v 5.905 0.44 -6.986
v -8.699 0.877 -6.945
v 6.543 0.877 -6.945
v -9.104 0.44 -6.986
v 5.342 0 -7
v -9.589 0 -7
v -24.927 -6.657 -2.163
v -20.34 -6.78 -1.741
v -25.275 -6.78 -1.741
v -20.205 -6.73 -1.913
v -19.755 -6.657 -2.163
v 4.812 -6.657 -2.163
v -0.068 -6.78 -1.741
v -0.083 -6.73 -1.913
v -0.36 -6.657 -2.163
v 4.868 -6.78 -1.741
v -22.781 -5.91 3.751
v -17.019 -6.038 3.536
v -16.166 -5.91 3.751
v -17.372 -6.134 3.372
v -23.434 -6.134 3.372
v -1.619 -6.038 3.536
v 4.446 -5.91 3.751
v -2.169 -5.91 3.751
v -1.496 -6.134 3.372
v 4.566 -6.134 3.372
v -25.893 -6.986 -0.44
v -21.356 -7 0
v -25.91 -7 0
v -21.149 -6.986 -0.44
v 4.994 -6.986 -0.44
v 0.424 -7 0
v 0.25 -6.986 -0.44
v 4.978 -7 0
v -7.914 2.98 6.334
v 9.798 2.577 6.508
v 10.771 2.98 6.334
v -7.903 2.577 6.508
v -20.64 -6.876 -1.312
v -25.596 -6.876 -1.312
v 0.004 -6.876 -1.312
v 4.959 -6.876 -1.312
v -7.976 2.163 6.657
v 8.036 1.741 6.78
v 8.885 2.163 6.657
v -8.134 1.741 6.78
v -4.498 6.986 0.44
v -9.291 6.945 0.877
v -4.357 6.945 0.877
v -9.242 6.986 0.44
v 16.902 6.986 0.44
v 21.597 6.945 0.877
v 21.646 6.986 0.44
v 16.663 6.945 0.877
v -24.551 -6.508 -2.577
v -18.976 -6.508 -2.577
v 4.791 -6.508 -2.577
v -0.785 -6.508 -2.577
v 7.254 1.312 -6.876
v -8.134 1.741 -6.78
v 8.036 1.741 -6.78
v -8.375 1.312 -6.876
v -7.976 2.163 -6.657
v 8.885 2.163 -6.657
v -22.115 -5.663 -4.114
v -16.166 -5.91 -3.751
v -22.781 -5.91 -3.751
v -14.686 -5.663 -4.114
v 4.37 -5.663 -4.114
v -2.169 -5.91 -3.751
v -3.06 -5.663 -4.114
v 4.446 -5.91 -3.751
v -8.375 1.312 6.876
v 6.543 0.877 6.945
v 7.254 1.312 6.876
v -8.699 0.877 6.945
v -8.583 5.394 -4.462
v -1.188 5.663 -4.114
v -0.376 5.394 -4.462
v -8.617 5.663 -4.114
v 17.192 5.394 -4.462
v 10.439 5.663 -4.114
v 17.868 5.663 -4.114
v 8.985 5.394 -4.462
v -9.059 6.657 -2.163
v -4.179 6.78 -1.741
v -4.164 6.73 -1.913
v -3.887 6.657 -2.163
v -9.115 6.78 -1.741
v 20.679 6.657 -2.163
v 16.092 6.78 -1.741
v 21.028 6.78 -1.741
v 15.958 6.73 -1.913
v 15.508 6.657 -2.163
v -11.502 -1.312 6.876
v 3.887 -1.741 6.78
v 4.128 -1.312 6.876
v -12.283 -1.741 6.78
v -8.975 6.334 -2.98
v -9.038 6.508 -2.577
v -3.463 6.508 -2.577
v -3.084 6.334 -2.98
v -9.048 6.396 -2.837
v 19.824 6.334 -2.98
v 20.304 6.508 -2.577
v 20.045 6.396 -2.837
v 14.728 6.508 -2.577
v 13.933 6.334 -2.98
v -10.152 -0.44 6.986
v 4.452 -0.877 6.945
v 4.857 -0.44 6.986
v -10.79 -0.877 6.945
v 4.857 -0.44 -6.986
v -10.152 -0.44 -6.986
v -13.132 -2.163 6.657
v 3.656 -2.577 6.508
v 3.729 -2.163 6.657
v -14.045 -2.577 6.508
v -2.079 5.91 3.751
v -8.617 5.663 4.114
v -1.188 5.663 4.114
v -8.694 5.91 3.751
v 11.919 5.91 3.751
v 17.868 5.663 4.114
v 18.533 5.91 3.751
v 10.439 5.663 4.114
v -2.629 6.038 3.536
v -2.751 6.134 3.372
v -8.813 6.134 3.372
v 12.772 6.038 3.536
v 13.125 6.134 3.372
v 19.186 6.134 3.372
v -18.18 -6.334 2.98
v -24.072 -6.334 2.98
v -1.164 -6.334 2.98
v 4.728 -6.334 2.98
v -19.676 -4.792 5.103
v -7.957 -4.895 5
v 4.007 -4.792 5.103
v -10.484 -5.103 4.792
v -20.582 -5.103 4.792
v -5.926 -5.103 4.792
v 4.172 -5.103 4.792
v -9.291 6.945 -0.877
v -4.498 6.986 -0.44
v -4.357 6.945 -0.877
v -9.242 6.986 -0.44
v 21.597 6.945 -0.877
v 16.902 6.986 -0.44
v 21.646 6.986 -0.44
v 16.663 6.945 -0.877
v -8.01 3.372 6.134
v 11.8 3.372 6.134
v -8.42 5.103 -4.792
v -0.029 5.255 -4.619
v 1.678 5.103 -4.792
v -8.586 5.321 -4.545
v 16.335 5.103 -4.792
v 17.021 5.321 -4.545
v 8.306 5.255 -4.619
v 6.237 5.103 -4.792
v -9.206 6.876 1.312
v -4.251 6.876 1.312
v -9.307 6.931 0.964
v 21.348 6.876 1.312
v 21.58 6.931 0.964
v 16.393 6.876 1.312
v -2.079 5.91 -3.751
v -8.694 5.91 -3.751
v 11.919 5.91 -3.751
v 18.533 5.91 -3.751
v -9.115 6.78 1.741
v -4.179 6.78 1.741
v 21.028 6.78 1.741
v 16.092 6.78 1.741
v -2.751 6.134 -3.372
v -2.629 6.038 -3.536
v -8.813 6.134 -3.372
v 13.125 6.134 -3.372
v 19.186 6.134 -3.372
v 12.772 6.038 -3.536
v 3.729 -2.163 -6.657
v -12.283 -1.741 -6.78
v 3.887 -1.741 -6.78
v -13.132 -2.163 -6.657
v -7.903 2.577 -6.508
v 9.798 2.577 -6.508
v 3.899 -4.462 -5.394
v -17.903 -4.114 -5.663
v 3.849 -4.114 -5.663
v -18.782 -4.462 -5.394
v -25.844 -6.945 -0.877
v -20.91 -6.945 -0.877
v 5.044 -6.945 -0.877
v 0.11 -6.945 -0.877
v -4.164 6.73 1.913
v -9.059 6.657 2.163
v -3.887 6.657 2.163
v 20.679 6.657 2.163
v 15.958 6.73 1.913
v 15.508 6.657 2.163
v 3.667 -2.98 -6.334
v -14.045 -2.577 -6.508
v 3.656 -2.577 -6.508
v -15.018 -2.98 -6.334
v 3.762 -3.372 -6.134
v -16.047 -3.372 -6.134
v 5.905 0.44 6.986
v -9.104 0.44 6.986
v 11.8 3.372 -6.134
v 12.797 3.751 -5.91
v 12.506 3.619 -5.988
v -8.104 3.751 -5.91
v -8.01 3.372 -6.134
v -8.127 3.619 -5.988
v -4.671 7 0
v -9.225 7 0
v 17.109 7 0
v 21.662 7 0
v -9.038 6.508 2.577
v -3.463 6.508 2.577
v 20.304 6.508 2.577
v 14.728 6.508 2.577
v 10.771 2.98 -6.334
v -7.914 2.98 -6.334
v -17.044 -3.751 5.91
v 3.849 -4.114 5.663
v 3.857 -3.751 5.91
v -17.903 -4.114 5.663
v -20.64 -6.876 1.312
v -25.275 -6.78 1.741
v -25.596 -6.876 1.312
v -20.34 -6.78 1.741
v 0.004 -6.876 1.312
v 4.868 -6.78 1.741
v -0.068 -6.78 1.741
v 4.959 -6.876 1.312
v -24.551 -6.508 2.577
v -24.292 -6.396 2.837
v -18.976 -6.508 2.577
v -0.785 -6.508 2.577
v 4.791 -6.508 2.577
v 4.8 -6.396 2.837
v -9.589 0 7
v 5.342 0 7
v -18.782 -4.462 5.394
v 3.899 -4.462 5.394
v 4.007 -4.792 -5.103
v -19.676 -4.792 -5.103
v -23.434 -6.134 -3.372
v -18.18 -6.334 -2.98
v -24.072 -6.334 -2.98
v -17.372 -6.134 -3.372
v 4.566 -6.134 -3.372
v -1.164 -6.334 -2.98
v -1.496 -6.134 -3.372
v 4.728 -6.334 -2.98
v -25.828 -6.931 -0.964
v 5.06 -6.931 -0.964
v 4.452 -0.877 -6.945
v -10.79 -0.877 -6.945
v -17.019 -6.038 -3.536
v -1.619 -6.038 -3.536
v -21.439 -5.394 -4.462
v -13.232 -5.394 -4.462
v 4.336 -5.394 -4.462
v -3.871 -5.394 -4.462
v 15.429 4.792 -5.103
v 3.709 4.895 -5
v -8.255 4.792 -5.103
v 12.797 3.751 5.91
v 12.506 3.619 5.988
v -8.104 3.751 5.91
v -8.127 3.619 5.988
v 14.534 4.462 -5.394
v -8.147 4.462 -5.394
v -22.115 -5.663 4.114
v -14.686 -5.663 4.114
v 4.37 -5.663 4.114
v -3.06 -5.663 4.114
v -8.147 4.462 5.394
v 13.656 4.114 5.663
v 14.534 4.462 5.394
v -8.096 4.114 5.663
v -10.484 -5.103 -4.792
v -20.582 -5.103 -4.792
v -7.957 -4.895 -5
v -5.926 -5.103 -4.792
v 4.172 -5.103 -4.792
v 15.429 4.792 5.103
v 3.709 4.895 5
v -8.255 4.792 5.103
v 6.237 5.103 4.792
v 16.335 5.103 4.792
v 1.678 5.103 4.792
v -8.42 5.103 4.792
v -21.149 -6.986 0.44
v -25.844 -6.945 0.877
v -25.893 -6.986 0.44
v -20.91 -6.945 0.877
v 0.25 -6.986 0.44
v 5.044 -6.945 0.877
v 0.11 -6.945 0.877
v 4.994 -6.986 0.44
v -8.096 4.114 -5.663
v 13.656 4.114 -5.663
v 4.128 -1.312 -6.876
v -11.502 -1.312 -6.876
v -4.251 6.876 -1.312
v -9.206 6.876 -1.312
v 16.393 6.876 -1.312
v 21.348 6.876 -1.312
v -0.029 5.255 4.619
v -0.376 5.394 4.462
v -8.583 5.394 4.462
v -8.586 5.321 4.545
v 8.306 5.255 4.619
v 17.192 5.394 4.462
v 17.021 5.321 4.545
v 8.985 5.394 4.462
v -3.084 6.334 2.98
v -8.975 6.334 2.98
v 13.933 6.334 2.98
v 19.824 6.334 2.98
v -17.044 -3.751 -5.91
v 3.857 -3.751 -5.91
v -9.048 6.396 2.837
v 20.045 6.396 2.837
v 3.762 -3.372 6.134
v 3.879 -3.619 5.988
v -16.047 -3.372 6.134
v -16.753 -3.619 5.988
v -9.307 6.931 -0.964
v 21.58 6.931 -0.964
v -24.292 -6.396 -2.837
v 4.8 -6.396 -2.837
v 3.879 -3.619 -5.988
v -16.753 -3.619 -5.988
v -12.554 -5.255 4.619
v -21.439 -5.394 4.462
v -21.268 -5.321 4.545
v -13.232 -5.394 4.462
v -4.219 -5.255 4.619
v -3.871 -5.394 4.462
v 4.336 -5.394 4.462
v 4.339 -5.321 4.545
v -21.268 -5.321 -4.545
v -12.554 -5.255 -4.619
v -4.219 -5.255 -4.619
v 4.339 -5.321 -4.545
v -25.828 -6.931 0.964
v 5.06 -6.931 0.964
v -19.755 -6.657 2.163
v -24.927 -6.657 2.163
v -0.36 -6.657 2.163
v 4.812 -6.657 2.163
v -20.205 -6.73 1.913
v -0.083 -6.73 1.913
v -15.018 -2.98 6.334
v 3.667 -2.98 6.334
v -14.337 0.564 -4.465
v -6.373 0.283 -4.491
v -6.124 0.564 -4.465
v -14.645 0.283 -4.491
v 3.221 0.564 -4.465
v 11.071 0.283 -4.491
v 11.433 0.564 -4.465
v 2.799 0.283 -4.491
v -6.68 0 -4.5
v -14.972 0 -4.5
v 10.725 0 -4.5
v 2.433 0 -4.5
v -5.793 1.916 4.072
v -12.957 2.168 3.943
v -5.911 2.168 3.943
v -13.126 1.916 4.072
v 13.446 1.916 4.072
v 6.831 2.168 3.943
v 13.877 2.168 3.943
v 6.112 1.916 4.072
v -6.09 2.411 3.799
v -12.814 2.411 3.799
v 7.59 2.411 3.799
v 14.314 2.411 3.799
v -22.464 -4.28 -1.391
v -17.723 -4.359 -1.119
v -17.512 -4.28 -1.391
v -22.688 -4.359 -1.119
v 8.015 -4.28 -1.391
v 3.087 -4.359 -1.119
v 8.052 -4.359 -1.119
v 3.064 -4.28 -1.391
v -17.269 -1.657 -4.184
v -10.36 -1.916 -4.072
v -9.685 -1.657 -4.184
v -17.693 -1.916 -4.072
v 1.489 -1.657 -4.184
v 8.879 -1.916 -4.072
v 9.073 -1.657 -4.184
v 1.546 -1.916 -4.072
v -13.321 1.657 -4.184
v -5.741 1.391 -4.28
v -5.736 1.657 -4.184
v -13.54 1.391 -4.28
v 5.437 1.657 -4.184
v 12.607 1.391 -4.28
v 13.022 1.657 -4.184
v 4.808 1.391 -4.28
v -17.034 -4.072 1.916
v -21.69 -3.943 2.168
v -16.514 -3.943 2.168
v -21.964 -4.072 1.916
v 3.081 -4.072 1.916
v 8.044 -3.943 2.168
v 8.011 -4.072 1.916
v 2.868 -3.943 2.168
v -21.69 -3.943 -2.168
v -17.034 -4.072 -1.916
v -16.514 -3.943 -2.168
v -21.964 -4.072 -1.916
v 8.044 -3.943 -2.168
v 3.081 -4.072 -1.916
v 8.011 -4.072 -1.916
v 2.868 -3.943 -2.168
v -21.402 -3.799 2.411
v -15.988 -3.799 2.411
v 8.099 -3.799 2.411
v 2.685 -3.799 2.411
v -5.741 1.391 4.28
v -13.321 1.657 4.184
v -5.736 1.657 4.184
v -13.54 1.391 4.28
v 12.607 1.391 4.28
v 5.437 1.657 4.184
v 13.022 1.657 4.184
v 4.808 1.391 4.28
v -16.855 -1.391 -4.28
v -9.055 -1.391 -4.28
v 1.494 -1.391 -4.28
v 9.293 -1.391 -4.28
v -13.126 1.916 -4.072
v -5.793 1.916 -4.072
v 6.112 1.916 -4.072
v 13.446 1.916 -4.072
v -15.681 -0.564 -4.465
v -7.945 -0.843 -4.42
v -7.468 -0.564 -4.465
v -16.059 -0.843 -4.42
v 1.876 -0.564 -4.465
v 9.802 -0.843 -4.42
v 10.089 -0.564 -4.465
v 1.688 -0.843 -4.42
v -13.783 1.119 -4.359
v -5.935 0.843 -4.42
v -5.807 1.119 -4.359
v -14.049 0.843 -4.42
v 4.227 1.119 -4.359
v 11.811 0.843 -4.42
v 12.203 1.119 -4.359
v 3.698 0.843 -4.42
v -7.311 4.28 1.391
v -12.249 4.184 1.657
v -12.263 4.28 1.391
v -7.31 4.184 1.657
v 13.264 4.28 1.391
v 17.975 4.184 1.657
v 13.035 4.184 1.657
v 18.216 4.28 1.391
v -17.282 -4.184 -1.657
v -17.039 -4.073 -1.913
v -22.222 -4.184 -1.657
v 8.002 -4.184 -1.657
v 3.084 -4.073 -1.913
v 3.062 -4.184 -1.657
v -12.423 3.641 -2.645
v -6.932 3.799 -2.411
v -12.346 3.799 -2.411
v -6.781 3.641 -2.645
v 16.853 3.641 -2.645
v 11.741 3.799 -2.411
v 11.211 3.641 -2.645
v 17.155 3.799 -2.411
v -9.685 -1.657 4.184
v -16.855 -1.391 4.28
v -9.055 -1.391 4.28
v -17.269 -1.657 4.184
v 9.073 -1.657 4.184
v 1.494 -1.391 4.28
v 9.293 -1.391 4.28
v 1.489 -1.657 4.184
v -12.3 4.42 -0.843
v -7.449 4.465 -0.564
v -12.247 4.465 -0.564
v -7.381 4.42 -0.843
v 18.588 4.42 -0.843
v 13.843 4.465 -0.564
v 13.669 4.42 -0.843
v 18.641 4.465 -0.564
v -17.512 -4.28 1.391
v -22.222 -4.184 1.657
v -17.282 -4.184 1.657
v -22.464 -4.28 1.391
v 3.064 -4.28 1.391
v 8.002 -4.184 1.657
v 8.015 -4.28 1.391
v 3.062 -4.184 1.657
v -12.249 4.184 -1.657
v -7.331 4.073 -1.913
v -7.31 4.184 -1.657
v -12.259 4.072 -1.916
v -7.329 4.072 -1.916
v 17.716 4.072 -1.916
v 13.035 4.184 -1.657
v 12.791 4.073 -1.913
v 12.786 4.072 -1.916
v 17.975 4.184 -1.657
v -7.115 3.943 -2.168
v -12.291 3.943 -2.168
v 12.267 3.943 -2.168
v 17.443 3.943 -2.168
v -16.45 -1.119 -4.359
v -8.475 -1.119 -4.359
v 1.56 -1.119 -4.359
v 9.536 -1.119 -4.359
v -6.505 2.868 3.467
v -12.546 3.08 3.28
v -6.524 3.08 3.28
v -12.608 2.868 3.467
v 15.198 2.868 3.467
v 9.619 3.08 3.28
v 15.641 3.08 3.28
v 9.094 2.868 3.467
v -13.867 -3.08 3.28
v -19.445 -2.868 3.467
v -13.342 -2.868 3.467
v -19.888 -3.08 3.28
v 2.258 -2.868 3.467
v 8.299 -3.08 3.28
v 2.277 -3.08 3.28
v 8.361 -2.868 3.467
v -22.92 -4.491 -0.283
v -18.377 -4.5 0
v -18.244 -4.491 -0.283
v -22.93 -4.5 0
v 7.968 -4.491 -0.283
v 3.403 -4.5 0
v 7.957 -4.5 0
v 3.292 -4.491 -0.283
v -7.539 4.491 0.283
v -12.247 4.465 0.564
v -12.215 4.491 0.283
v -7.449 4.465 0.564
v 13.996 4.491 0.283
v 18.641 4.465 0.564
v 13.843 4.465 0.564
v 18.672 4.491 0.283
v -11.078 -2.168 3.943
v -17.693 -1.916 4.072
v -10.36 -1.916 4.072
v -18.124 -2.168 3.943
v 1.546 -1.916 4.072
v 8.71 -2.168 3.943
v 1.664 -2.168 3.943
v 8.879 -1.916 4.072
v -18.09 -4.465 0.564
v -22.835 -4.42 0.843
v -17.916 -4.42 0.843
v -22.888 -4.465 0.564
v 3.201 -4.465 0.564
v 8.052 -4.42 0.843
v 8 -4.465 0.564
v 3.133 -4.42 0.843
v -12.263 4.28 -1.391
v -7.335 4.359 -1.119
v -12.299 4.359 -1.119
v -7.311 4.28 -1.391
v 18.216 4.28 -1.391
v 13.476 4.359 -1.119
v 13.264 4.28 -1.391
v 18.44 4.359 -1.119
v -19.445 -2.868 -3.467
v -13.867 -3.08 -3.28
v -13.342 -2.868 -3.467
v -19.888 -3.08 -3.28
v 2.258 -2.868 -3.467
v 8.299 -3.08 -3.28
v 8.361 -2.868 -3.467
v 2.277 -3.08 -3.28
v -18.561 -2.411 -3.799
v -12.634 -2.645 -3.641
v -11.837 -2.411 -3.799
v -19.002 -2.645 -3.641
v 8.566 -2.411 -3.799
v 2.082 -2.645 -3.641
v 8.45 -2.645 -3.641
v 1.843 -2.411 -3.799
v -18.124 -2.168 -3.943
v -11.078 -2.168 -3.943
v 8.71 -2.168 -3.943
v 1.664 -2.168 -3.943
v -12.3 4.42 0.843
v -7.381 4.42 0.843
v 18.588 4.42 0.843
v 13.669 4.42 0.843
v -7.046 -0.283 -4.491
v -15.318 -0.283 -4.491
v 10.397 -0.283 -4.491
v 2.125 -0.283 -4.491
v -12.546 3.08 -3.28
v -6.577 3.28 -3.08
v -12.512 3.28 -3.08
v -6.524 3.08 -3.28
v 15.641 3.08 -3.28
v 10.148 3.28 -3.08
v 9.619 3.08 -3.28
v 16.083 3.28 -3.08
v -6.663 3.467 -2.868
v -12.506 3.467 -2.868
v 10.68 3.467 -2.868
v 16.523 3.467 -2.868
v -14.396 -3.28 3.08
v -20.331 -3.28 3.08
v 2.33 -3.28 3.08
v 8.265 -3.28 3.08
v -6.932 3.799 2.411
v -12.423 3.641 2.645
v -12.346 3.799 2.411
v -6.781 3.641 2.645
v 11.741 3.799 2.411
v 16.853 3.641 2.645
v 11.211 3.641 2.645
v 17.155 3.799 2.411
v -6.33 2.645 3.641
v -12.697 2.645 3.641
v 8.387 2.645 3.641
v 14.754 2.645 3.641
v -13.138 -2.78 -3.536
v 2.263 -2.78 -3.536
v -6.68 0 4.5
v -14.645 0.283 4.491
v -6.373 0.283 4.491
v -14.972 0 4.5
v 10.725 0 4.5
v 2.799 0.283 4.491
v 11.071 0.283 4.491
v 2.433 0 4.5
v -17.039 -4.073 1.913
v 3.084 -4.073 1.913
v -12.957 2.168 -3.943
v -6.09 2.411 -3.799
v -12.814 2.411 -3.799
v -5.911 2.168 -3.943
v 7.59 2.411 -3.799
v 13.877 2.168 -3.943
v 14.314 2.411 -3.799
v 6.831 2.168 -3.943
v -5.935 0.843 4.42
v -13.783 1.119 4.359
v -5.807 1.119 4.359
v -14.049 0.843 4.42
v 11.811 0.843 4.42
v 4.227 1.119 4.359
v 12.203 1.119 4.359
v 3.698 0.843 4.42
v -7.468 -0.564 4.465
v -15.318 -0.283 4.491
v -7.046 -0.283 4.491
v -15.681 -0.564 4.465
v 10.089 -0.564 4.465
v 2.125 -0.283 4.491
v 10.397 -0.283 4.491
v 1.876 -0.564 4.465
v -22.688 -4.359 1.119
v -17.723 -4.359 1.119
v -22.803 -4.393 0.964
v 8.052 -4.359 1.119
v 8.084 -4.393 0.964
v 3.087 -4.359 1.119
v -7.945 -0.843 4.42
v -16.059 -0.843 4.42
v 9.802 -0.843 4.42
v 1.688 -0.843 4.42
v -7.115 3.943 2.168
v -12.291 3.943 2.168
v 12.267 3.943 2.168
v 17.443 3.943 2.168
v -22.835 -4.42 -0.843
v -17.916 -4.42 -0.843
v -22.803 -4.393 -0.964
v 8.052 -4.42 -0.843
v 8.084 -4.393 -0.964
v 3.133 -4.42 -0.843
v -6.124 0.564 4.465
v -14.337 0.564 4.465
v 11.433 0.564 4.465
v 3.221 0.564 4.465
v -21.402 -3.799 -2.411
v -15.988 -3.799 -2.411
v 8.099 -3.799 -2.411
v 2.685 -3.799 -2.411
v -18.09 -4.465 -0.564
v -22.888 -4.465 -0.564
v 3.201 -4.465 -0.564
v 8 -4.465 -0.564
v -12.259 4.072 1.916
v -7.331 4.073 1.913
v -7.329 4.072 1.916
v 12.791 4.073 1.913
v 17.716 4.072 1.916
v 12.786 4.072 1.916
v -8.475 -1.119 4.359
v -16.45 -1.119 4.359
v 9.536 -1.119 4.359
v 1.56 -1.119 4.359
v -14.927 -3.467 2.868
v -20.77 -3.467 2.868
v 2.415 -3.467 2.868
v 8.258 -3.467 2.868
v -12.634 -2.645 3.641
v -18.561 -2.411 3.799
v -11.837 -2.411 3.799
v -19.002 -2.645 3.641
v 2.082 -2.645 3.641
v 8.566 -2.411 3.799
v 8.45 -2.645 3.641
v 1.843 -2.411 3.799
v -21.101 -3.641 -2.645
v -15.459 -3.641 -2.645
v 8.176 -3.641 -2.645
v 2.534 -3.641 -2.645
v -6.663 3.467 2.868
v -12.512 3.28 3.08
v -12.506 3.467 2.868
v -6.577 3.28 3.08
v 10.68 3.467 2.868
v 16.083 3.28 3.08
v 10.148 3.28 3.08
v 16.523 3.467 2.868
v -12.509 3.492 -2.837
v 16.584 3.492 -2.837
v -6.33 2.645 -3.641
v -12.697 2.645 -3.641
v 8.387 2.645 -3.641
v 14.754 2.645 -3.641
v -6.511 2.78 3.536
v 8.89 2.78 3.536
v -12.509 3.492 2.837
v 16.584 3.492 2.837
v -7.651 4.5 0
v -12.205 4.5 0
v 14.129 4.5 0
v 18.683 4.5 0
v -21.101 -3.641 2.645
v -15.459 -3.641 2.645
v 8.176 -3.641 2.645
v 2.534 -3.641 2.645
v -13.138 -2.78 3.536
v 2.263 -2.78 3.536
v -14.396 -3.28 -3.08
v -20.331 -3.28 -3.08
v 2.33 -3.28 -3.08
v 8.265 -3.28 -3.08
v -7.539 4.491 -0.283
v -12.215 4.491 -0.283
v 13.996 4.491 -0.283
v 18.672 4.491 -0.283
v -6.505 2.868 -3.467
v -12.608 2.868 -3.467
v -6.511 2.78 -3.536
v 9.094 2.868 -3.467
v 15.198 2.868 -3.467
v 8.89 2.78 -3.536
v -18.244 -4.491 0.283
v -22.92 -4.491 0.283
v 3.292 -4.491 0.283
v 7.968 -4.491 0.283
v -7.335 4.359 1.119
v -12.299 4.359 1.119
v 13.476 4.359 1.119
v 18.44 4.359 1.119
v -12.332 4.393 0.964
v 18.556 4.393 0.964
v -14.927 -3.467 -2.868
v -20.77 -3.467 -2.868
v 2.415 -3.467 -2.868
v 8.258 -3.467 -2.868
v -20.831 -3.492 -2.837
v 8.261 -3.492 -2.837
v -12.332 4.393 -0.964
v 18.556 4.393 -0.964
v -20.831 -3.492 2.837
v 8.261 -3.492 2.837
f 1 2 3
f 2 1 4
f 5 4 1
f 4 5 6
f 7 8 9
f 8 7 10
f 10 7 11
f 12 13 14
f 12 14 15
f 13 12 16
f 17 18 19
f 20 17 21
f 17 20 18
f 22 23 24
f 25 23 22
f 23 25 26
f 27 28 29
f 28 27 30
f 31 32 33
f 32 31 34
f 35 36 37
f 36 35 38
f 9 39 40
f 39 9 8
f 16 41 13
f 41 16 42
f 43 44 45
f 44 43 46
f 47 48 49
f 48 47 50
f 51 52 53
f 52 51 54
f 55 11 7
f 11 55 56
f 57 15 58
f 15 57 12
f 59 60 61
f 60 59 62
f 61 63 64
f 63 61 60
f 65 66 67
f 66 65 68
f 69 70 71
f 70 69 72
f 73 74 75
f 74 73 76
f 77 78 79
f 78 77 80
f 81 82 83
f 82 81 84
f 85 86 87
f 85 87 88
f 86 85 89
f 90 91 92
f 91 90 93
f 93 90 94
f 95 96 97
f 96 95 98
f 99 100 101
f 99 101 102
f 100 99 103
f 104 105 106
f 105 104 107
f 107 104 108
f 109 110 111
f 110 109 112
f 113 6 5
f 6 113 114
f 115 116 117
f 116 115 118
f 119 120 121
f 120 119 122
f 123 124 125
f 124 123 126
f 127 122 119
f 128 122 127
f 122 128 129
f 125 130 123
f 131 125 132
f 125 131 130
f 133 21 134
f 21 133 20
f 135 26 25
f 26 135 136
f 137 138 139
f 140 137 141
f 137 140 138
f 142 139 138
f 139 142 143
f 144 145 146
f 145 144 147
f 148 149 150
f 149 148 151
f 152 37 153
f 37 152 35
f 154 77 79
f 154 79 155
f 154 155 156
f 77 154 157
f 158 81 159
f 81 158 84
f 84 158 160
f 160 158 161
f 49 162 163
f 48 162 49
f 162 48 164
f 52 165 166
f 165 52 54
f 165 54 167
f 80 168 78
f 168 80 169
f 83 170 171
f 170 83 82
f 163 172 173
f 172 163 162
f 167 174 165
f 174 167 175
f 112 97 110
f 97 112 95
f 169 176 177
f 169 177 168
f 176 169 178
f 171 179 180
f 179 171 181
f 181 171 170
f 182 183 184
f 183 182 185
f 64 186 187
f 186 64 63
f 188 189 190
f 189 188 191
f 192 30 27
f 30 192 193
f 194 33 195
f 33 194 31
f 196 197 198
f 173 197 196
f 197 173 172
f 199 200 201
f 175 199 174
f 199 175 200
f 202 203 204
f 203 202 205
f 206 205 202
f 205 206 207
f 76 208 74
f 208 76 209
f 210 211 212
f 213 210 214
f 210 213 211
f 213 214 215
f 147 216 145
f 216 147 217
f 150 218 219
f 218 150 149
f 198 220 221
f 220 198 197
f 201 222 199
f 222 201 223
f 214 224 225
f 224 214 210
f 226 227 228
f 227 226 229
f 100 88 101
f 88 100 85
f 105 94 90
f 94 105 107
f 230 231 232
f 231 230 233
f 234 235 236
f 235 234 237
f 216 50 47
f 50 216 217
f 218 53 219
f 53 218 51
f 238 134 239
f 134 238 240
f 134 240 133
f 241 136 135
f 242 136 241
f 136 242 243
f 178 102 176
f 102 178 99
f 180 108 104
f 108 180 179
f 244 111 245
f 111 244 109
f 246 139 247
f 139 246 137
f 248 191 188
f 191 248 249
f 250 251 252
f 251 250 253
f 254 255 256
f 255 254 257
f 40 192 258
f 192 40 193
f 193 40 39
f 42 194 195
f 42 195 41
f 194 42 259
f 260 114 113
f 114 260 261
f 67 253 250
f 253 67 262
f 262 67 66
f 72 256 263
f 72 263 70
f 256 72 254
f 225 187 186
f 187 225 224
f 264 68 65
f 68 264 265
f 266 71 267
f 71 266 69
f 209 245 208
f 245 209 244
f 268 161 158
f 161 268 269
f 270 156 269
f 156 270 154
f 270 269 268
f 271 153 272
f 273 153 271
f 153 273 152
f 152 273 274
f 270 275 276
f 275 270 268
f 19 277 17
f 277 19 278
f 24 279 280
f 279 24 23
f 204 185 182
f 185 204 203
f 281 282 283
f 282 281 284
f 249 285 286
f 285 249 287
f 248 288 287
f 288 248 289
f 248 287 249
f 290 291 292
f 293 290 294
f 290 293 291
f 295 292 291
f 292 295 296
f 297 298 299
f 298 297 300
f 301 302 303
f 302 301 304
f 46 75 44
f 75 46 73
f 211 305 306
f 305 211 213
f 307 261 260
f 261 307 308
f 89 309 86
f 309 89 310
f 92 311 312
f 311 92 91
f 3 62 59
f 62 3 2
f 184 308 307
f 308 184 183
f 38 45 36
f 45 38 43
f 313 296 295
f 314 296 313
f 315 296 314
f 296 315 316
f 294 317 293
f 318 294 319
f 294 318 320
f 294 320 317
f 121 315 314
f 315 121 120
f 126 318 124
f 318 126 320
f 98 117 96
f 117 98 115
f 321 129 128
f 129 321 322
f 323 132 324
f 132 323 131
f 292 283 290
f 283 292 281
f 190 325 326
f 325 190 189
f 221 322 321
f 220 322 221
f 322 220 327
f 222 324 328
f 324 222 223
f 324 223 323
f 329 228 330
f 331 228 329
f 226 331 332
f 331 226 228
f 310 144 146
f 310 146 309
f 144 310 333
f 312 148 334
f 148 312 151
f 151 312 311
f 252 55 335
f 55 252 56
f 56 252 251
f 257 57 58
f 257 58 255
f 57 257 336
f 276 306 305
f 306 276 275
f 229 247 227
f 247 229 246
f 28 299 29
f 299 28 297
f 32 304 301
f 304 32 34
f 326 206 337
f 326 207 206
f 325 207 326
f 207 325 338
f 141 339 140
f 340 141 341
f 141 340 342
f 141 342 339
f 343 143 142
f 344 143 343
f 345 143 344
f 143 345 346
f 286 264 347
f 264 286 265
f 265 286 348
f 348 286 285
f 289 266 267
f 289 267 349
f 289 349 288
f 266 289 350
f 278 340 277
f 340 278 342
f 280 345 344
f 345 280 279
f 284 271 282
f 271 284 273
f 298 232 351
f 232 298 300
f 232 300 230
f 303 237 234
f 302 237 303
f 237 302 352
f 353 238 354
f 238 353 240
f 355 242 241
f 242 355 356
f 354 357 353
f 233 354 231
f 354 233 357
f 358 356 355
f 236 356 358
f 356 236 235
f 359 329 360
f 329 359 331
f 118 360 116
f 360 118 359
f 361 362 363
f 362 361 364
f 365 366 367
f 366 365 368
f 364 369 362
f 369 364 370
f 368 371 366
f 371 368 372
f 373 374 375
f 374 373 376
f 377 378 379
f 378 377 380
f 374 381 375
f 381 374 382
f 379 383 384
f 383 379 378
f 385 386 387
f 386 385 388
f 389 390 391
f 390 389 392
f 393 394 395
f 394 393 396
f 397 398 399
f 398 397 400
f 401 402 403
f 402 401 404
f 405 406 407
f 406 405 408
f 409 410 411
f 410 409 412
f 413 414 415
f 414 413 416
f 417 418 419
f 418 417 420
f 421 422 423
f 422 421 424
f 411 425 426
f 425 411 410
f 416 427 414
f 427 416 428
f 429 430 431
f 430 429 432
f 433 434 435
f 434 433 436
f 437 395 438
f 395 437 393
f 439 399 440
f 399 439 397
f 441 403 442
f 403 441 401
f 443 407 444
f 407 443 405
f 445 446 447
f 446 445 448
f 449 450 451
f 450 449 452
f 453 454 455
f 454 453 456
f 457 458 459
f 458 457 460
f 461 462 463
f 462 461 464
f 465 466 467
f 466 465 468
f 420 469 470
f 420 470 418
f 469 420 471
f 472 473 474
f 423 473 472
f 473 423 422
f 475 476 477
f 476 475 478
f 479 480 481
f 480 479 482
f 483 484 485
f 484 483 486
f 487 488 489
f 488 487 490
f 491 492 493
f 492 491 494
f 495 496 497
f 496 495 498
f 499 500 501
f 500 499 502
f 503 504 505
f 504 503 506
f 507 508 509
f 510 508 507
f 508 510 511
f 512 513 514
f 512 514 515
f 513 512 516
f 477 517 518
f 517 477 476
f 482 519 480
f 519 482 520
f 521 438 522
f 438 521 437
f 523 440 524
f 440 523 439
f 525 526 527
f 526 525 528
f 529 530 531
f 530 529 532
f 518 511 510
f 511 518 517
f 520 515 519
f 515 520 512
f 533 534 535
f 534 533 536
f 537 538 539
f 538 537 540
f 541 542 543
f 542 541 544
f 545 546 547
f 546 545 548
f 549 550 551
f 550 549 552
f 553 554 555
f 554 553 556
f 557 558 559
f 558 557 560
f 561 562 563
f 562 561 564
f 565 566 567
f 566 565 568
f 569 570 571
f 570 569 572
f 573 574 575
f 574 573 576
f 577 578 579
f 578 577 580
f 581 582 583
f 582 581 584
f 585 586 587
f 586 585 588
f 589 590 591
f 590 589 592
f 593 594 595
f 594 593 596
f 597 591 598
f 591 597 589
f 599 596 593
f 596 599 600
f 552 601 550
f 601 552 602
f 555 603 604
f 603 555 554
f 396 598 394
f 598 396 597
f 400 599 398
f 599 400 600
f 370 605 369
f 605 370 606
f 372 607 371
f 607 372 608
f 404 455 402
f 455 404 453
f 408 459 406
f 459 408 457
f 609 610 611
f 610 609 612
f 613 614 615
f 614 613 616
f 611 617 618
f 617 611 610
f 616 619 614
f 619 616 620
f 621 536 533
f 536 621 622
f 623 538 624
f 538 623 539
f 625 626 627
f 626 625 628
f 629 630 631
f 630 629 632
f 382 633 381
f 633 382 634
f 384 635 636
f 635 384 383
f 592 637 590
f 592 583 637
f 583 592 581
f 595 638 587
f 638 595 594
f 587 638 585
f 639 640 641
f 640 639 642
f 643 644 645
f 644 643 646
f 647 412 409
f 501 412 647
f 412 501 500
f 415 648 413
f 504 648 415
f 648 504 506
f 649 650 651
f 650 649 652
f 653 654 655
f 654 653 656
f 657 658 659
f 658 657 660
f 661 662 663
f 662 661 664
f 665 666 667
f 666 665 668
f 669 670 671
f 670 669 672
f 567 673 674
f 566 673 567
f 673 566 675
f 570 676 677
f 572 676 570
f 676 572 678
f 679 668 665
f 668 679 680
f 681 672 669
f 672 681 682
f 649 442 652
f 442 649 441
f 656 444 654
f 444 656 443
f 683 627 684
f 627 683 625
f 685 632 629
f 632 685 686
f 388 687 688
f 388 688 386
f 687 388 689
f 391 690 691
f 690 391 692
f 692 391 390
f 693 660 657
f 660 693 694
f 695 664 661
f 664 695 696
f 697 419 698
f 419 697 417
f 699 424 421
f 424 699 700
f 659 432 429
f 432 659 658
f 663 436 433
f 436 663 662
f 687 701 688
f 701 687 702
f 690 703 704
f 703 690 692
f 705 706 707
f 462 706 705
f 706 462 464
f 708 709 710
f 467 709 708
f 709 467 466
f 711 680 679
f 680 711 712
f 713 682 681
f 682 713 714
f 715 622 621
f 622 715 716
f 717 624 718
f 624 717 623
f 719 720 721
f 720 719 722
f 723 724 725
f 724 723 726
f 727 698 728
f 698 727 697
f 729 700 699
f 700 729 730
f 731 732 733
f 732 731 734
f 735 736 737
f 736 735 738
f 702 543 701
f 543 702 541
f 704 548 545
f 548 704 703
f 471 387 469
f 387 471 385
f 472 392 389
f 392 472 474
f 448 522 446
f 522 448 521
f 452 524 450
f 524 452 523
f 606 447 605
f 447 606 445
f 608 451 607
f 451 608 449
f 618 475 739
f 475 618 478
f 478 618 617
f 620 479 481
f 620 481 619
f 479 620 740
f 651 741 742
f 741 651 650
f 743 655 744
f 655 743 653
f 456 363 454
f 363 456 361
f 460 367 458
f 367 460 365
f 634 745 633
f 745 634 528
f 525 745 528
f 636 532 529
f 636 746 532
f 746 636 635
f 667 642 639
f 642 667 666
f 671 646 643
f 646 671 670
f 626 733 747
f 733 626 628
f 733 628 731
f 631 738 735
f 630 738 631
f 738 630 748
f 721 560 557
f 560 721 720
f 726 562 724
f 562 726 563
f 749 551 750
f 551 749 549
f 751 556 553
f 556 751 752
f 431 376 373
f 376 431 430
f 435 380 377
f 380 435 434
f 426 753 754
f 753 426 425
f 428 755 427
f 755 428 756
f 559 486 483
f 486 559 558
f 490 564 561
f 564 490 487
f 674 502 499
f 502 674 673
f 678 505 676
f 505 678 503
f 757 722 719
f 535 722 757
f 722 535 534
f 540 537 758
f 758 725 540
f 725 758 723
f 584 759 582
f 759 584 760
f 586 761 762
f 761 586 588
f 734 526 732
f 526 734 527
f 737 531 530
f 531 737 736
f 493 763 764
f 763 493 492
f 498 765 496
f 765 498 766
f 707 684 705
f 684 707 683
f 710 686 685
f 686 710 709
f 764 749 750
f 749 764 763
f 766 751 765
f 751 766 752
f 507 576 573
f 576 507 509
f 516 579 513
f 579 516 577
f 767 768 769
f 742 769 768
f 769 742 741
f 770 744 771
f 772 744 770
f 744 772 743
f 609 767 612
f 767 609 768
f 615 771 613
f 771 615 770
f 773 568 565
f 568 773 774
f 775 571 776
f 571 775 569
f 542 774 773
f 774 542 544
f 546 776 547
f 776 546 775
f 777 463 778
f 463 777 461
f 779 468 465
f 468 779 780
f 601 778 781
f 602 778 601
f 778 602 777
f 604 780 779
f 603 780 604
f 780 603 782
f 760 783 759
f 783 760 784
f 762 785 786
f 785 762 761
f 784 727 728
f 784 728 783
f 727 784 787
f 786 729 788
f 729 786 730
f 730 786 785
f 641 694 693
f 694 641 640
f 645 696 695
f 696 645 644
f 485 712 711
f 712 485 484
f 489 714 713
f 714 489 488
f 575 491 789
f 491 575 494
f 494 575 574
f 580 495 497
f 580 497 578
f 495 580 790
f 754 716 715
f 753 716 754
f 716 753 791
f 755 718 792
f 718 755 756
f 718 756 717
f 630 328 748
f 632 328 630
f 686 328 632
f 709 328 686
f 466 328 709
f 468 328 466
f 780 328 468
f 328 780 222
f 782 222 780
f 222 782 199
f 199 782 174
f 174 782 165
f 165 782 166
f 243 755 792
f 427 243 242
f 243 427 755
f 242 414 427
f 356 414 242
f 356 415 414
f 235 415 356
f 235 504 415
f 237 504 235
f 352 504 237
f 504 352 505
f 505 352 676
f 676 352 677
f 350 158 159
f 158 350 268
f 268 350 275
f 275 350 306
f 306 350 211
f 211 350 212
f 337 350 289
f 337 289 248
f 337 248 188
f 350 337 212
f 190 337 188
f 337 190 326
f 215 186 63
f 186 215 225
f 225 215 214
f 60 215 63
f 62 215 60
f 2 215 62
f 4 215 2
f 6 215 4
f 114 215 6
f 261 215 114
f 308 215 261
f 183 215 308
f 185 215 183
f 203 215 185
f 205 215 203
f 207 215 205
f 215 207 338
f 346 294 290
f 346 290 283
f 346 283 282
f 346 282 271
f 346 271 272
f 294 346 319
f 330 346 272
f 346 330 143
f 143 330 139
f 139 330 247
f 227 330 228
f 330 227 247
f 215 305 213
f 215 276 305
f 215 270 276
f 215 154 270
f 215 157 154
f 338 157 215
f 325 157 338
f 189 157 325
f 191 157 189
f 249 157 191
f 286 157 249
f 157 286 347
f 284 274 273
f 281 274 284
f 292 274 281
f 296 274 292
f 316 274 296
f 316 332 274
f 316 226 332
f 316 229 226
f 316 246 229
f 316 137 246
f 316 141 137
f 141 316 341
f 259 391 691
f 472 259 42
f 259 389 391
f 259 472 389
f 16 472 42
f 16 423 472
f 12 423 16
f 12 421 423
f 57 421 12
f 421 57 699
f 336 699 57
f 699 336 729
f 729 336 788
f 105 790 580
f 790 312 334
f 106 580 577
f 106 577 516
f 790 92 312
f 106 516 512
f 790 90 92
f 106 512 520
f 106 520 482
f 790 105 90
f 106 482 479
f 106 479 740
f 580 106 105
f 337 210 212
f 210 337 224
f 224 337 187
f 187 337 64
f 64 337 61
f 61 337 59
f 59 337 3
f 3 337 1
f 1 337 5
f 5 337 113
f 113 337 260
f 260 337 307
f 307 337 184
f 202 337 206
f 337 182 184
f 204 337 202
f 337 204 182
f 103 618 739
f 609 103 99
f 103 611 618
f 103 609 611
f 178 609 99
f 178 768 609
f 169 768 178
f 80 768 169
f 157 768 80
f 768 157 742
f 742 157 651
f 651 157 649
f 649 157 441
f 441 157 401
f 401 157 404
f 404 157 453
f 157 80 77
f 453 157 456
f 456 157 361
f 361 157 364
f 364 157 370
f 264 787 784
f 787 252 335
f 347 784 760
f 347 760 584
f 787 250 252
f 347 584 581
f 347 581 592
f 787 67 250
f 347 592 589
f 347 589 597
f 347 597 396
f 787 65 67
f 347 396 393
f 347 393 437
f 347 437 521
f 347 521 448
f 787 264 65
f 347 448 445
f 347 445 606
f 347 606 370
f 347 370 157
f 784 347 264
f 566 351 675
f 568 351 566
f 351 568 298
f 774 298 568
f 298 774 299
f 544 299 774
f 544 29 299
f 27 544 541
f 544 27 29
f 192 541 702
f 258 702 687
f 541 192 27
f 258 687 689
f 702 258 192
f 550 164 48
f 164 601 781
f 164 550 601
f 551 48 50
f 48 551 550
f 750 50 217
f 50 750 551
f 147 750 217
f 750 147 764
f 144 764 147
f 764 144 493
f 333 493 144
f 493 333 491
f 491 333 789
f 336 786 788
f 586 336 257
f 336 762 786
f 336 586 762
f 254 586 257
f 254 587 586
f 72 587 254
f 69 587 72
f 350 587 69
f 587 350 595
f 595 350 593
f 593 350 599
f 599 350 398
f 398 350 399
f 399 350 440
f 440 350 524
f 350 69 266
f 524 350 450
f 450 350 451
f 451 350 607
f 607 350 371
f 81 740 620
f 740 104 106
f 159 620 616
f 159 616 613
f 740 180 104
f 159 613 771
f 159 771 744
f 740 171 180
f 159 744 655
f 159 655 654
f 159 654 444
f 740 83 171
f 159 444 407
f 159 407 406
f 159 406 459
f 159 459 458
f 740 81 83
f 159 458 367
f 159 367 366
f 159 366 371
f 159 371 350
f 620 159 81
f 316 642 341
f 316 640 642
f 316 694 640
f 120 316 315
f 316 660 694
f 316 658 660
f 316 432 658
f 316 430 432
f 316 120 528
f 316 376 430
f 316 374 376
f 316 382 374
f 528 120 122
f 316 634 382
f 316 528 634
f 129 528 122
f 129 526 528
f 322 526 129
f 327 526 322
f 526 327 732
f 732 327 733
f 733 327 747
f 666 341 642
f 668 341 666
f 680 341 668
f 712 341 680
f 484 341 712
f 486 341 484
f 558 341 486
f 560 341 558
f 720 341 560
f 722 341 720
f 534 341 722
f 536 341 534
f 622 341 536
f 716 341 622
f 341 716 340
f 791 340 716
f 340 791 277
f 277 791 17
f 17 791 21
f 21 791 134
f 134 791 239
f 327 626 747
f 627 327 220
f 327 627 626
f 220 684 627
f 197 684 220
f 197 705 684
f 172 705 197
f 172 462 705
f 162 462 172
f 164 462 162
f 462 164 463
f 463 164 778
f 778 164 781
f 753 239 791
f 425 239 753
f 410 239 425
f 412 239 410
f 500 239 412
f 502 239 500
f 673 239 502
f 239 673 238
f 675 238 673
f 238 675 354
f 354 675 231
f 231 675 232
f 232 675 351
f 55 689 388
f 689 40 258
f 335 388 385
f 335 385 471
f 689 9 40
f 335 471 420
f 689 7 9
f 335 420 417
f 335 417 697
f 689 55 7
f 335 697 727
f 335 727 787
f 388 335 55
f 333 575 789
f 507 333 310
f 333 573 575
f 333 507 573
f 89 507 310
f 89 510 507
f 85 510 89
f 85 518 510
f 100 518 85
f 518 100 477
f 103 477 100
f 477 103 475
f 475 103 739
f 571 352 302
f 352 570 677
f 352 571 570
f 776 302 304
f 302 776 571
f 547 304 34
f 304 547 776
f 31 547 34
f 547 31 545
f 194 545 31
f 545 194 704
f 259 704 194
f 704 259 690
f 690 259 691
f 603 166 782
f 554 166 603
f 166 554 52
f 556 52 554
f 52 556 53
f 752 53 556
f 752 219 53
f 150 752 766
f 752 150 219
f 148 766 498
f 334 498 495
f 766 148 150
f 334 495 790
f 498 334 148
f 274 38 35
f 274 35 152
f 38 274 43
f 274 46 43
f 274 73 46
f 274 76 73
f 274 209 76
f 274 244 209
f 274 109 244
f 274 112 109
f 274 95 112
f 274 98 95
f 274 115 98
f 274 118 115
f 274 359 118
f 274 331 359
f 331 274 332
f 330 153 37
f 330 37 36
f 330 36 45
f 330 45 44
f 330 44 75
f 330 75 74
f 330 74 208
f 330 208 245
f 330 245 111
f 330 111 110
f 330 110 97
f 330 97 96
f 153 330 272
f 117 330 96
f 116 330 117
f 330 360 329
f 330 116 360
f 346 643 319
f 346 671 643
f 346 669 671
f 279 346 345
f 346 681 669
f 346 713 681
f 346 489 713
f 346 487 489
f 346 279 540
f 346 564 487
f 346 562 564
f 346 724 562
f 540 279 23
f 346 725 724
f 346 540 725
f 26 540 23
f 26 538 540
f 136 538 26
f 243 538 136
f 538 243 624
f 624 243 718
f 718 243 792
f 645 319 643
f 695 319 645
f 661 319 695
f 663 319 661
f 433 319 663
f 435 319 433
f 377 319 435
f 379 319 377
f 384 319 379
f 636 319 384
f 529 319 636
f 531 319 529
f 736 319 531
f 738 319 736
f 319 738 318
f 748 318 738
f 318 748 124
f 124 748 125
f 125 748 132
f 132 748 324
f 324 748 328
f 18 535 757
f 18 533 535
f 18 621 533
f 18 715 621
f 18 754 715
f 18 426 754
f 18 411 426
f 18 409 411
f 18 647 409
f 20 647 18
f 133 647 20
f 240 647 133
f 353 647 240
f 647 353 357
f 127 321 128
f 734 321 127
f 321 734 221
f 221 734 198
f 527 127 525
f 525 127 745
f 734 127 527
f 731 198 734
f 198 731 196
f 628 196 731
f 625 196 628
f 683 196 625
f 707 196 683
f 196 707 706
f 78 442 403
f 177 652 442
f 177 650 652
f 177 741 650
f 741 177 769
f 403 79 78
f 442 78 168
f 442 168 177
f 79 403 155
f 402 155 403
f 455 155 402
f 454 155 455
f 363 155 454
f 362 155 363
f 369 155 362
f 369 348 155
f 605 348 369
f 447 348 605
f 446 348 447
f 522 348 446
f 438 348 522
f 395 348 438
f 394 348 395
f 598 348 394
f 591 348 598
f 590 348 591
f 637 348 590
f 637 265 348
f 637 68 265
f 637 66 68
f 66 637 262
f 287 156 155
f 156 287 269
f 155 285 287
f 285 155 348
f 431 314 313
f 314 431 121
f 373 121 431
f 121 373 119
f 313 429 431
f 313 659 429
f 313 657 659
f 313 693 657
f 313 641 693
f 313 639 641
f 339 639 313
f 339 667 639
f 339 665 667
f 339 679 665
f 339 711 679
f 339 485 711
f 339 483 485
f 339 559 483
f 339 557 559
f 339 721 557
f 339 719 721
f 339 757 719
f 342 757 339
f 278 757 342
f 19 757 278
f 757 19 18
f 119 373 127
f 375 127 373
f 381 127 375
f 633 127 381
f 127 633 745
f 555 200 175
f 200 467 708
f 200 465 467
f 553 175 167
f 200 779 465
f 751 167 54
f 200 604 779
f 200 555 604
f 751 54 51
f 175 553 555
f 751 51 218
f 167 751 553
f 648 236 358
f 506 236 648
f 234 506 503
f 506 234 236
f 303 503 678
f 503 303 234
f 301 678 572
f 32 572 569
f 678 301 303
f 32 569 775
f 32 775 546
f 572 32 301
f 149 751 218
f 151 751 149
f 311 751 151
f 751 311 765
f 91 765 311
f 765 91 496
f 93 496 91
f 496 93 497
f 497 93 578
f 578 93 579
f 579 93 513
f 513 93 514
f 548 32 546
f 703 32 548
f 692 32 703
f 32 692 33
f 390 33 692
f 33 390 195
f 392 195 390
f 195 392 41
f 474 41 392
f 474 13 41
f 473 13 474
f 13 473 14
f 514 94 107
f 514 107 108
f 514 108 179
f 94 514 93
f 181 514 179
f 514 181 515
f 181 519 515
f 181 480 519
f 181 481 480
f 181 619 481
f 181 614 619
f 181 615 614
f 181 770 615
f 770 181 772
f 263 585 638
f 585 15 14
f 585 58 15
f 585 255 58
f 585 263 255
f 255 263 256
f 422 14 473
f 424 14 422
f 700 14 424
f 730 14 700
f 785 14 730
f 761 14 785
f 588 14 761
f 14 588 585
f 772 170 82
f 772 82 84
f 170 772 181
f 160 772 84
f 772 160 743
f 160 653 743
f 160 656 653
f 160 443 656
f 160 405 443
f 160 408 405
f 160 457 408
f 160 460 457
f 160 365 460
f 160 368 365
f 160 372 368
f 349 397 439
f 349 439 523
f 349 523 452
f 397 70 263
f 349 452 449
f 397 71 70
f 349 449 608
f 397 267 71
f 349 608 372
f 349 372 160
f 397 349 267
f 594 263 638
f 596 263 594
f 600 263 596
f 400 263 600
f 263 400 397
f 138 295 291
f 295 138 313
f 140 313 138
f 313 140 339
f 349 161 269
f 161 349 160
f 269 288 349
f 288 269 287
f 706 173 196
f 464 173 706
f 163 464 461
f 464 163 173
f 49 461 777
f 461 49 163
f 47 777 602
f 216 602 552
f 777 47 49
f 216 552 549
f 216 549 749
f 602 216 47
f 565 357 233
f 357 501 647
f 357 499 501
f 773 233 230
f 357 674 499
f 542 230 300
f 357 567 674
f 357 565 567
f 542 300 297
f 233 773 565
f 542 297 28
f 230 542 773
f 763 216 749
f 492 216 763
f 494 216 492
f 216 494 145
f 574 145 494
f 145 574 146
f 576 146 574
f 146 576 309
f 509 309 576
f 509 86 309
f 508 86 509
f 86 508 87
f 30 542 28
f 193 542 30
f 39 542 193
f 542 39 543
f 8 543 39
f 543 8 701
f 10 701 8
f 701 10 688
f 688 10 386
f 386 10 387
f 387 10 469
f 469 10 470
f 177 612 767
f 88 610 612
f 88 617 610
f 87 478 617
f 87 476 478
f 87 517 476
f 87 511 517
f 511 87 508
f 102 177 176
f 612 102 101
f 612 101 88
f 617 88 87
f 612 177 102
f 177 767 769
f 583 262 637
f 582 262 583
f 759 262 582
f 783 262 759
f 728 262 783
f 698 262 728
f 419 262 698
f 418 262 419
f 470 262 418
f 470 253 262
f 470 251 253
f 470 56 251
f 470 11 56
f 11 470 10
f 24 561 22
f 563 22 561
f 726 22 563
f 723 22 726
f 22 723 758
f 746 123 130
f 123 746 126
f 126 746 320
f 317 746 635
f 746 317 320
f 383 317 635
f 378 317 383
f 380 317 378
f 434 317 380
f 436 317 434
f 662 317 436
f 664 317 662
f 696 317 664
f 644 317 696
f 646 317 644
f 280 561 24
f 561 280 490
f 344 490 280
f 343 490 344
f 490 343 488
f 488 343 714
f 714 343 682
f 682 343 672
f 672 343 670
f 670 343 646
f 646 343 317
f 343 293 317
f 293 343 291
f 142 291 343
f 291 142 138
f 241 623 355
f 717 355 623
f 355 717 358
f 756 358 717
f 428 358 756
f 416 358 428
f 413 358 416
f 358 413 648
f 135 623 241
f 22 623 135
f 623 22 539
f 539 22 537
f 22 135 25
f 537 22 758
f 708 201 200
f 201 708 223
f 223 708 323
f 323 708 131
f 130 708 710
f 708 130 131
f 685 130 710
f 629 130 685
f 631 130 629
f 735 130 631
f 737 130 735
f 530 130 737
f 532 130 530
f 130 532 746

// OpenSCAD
// file: ../../../shapes/open-oval/open-oval.scad
use <MCAD/shapes.scad>
//use </usr/share/openscad/libraries/MCAD/shapes.scad>
//use </Applications/OpenSCAD.app/Contents/Resources/libraries/MCAD/shapes.scad>

module openOval(borderThickness = 3, xLength = 20, yLength = 10, zLength = 1)
{
	openOval2d(borderThickness = borderThickness,
			   depth = zLength,
			   width = xLength,
			   height = yLength);
}

/** Support functions and modules follow.  **/

module openOval2d(borderThickness = 3,
				  depth = 5,
				  height = 10,
				  width = 20)
{
	difference()
	{
		ellipticalCylinder(w = width, h = height, height = depth);

		w = width - borderThickness;
		h = height - borderThickness;
		translate([0, 0, -0.02])
		ellipticalCylinder(w = w, h = h, height = depth + 0.1);
	}
}
// file: ../../../shapes/open-cylinder/open-cylinder.scad
// TODO: Lower this to 50.
module openCylinder(height = 3,
                    outerRadius = 7,
                    innerRadius = 4.5,
                    fn = 100)
{
    $fn = fn;

    difference()
    {
        cylinder(r=outerRadius,
                 h=height);

        translate([0, 0, -1])
        cylinder(r=innerRadius,
                 h=height+1.01);
    }
}
// main file
use <../../../shapes/open-cylinder/open-cylinder.scad>

use <../../../shapes/open-oval/open-oval.scad>

intersection()
{
    translate([-30,0,0])
    rotate([0,90,0])
    openCylinder(height = 70);

    color("green")
    translate([-20, -15,0])
    rotate([0,90,40])
    openOval(xLength = 8,
            yLength = 10,
            zLength = 50);
}
